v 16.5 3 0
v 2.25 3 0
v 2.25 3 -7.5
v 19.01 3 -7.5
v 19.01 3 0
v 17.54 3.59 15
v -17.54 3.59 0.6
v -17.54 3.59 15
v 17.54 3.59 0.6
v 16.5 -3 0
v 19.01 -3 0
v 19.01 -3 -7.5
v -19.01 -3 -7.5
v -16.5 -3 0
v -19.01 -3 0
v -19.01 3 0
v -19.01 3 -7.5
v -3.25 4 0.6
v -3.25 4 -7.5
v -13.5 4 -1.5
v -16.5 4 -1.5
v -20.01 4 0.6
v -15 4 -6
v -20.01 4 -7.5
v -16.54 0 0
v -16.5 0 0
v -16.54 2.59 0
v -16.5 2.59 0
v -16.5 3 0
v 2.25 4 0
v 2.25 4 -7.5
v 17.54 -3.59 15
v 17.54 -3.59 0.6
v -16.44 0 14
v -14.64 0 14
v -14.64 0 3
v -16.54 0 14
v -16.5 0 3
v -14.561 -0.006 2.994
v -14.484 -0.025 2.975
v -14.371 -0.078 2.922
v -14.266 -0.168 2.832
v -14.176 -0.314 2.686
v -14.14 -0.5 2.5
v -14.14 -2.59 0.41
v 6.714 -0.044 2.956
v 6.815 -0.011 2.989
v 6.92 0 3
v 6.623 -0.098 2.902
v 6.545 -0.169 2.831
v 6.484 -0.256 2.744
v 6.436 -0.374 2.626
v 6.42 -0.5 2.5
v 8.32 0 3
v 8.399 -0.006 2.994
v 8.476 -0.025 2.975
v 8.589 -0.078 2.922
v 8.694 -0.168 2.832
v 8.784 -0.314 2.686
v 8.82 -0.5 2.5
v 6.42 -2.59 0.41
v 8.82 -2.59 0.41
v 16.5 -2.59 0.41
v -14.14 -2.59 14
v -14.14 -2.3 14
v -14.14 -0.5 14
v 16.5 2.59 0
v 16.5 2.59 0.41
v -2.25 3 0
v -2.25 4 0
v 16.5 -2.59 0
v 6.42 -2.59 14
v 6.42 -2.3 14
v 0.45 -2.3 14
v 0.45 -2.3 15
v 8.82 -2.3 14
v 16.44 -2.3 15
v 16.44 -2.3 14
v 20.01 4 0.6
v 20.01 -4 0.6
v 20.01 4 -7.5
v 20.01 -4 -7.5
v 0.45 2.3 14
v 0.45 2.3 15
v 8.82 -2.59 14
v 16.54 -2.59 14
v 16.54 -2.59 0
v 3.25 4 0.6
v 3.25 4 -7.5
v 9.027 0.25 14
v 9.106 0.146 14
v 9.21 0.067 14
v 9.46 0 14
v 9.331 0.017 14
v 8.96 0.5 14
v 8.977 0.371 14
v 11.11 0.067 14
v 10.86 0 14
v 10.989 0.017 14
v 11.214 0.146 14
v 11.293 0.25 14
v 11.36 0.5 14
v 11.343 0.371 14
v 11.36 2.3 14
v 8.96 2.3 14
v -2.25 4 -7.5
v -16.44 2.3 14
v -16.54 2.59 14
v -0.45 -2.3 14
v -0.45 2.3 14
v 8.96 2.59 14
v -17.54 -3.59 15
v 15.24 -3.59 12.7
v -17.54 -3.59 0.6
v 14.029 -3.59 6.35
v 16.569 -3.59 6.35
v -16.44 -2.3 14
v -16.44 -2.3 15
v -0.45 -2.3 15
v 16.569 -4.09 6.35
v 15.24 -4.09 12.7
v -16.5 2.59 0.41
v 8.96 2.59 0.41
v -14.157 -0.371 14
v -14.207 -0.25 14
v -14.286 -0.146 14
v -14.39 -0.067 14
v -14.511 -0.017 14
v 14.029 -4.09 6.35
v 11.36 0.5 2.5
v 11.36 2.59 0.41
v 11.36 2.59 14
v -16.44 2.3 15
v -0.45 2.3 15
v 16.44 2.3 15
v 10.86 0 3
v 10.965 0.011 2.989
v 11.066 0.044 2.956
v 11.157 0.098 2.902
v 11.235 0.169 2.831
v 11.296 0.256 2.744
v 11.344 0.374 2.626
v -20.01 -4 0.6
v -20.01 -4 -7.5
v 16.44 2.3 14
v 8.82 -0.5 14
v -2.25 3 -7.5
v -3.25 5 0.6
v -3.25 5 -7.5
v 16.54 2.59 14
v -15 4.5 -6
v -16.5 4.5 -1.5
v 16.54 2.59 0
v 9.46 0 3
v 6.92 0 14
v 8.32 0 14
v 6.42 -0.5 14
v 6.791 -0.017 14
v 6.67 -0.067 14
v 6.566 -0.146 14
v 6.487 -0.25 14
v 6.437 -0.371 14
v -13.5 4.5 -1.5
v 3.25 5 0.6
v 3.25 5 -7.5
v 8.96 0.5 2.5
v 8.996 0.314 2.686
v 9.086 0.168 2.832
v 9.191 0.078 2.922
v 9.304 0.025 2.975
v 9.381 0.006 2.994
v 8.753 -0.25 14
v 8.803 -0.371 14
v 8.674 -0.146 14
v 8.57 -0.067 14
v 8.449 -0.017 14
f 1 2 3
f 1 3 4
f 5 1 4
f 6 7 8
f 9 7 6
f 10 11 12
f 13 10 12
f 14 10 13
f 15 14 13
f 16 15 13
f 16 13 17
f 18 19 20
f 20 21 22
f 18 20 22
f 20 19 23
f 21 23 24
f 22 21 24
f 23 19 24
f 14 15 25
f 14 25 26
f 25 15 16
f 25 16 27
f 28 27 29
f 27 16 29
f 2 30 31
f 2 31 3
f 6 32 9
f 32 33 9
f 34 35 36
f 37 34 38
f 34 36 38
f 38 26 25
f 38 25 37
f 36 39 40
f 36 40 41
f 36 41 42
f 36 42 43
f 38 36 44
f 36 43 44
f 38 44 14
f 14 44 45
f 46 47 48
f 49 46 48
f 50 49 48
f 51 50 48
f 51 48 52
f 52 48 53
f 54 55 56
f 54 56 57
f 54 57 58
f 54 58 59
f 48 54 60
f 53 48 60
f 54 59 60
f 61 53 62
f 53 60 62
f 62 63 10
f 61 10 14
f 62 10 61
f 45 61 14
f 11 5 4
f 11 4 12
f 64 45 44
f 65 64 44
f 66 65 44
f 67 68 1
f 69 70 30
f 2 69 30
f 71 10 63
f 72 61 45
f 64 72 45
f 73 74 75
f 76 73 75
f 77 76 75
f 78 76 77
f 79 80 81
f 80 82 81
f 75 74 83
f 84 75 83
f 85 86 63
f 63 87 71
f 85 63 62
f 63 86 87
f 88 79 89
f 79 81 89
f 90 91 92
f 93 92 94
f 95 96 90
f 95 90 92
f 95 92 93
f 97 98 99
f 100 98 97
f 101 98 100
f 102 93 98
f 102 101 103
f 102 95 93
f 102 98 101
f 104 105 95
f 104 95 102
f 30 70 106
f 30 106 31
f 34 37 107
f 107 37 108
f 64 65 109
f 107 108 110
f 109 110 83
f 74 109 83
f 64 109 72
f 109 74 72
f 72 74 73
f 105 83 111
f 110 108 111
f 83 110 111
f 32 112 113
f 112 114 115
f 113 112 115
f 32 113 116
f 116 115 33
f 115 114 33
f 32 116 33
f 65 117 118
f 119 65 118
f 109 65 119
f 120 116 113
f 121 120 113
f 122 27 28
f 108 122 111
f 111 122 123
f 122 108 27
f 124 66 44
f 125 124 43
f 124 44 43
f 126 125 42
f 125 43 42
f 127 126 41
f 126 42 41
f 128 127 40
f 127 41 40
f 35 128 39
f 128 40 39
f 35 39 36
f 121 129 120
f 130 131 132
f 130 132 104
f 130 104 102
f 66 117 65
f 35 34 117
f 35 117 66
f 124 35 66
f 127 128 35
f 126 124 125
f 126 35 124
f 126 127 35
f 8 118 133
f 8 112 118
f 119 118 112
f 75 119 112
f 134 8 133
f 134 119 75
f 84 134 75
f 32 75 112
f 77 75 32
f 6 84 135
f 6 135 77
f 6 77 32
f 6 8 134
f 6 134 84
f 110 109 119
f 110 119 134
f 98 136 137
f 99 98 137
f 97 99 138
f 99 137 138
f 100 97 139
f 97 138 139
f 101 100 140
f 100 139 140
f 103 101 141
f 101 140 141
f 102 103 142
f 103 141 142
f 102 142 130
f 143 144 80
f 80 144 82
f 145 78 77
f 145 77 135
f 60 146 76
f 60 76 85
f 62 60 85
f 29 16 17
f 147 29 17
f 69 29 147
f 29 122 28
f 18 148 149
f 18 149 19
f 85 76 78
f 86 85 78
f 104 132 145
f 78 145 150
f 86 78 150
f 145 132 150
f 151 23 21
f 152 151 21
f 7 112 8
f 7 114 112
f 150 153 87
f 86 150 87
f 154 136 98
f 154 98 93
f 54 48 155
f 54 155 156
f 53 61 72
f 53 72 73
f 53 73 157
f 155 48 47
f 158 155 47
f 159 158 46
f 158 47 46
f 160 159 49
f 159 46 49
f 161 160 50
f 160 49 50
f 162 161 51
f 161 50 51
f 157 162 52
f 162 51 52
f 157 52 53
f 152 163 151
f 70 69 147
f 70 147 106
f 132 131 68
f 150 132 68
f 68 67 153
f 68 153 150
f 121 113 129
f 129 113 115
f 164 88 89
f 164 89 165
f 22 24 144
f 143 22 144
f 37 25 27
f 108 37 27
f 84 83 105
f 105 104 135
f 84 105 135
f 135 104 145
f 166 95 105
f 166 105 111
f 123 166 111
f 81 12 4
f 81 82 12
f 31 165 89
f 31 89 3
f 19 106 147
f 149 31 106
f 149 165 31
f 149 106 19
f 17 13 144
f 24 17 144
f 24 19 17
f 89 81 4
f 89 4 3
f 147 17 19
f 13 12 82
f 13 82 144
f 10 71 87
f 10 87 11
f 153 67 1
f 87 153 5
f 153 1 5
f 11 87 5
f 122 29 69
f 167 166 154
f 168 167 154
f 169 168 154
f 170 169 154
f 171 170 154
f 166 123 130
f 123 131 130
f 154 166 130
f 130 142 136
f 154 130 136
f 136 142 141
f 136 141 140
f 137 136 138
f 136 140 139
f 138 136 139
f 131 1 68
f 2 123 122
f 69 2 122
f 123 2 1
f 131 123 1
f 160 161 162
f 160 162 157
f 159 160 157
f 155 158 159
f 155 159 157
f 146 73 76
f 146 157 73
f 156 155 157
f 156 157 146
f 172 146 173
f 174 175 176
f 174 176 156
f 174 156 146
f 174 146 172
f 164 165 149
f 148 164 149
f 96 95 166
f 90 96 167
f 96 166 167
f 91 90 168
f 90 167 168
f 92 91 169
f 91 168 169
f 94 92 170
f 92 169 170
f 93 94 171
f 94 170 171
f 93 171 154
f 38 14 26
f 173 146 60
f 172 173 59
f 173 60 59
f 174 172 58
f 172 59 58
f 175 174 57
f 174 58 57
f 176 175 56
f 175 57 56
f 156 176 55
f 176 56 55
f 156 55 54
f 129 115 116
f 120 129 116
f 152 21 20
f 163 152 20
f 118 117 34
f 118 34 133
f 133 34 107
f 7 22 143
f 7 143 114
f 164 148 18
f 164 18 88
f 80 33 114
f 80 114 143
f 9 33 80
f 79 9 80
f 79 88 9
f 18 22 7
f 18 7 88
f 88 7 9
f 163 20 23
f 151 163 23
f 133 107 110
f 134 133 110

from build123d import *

# Parameters (mm, degrees)
PAD_DEPTH     = 7.5
SKETCH002_W   = 34
SKETCH002_H   = 6.8
PAD001_DEPTH  = 0.6
SKETCH001_W   = 35.08
SKETCH001_H   = 7.18
PAD002_DEPTH  = 14
PAD003_DEPTH  = 0.5
PAD004_DEPTH  = 0.5
SKETCH005_W   = 35.08
SKETCH005_H   = 7.18
SKETCH005_W_2 = 15.99
SKETCH005_H_2 = 4.6
PAD005_DEPTH  = 1
POCKET_DEPTH  = 16.5


with BuildPart() as part:
    # Sketch → Pad (new body)
    with BuildSketch(Plane.XY):
        Polygon((-20.01, 4), (-3.25, 4), (-3.25, 5), (3.25, 5), (3.25, 4), (20.01, 4), (20.01, -4), (-20.01, -4), align=None)
        Polygon((-19.01, 3), (-2.25, 3), (-2.25, 4), (2.25, 4), (2.25, 3), (19.01, 3), (19.01, -3), (-19.01, -3), align=None, mode=Mode.SUBTRACT)
    extrude(amount=-PAD_DEPTH)

    # Sketch002 → Pad001 (join)
    with BuildSketch(Plane.XY):
        Polygon((-20.01, 4), (-20.01, -4), (20.01, -4), (20.01, 4), (3.25, 4), (3.25, 5), (-3.25, 5), (-3.25, 4), align=None)
        Rectangle(SKETCH002_W, SKETCH002_H, mode=Mode.SUBTRACT)
    extrude(amount=PAD001_DEPTH)

    # Sketch001 → Pad002 (join)
    with BuildSketch(Plane.XY):
        Rectangle(SKETCH001_W, SKETCH001_H)
        with BuildLine():
            Line((16.54, 2.59), (16.54, -2.59))
            Line((16.54, -2.59), (8.82, -2.59))
            Line((8.82, -0.5), (8.82, -2.59))
            ThreePointArc((8.82, -0.5), (8.673553, -0.146447), (8.32, 0))
            Line((6.92, 0), (8.32, 0))
            ThreePointArc((6.92, 0), (6.566447, -0.146447), (6.42, -0.5))
            Line((6.42, -2.59), (6.42, -0.5))
            Line((6.42, -2.59), (-14.14, -2.59))
            Line((-14.14, -2.59), (-14.14, -0.5))
            ThreePointArc((-14.14, -0.5), (-14.286447, -0.146447), (-14.64, 0))
            Line((-14.64, 0), (-16.54, 0))
            Line((-16.54, 0), (-16.54, 2.59))
            Line((-16.54, 2.59), (8.96, 2.59))
            Line((8.96, 0.5), (8.96, 2.59))
            ThreePointArc((8.96, 0.5), (9.106447, 0.146447), (9.46, 0))
            Line((10.86, 0), (9.46, 0))
            ThreePointArc((10.86, 0), (11.213553, 0.146447), (11.36, 0.5))
            Line((11.36, 2.59), (11.36, 0.5))
            Line((11.36, 2.59), (16.54, 2.59))
        make_face(mode=Mode.SUBTRACT)
    extrude(amount=PAD002_DEPTH)

    # Sketch003 (on Face1 of Pad) → Pad003 (join)
    with BuildSketch(Plane(origin=(0, 4, 0), x_dir=(-1, 0, 0), z_dir=(0, 1, 0))):
        Polygon((15, -6), (16.5, -1.5), (13.5, -1.5), align=None)
    extrude(amount=PAD003_DEPTH)

    # Sketch004 (on Face33 of Pad003) → Pad004 (join)
    with BuildSketch(Plane.XZ.offset(3.59)):
        Polygon((16.568533, 6.35), (15.24, 12.7), (14.028533, 6.35), align=None)
    extrude(amount=PAD004_DEPTH)

    # Sketch005 → Pad005 (join)
    with BuildSketch(Plane.XY.offset(14)):
        Rectangle(SKETCH005_W, SKETCH005_H)
        with Locations((-8.445, 0)):
            Rectangle(SKETCH005_W_2, SKETCH005_H_2, mode=Mode.SUBTRACT)
        with Locations((8.445, 0)):
            Rectangle(SKETCH005_W_2, SKETCH005_H_2, mode=Mode.SUBTRACT)
    extrude(amount=PAD005_DEPTH)

    # Sketch006 → Pocket (cut, symmetric)
    with BuildSketch(Plane.YZ):
        Polygon((-3, 0), (-3, -1), (3, -1), (3, 0), (0, 3), align=None)
    extrude(amount=POCKET_DEPTH, both=True, mode=Mode.SUBTRACT)


solid = part.part
